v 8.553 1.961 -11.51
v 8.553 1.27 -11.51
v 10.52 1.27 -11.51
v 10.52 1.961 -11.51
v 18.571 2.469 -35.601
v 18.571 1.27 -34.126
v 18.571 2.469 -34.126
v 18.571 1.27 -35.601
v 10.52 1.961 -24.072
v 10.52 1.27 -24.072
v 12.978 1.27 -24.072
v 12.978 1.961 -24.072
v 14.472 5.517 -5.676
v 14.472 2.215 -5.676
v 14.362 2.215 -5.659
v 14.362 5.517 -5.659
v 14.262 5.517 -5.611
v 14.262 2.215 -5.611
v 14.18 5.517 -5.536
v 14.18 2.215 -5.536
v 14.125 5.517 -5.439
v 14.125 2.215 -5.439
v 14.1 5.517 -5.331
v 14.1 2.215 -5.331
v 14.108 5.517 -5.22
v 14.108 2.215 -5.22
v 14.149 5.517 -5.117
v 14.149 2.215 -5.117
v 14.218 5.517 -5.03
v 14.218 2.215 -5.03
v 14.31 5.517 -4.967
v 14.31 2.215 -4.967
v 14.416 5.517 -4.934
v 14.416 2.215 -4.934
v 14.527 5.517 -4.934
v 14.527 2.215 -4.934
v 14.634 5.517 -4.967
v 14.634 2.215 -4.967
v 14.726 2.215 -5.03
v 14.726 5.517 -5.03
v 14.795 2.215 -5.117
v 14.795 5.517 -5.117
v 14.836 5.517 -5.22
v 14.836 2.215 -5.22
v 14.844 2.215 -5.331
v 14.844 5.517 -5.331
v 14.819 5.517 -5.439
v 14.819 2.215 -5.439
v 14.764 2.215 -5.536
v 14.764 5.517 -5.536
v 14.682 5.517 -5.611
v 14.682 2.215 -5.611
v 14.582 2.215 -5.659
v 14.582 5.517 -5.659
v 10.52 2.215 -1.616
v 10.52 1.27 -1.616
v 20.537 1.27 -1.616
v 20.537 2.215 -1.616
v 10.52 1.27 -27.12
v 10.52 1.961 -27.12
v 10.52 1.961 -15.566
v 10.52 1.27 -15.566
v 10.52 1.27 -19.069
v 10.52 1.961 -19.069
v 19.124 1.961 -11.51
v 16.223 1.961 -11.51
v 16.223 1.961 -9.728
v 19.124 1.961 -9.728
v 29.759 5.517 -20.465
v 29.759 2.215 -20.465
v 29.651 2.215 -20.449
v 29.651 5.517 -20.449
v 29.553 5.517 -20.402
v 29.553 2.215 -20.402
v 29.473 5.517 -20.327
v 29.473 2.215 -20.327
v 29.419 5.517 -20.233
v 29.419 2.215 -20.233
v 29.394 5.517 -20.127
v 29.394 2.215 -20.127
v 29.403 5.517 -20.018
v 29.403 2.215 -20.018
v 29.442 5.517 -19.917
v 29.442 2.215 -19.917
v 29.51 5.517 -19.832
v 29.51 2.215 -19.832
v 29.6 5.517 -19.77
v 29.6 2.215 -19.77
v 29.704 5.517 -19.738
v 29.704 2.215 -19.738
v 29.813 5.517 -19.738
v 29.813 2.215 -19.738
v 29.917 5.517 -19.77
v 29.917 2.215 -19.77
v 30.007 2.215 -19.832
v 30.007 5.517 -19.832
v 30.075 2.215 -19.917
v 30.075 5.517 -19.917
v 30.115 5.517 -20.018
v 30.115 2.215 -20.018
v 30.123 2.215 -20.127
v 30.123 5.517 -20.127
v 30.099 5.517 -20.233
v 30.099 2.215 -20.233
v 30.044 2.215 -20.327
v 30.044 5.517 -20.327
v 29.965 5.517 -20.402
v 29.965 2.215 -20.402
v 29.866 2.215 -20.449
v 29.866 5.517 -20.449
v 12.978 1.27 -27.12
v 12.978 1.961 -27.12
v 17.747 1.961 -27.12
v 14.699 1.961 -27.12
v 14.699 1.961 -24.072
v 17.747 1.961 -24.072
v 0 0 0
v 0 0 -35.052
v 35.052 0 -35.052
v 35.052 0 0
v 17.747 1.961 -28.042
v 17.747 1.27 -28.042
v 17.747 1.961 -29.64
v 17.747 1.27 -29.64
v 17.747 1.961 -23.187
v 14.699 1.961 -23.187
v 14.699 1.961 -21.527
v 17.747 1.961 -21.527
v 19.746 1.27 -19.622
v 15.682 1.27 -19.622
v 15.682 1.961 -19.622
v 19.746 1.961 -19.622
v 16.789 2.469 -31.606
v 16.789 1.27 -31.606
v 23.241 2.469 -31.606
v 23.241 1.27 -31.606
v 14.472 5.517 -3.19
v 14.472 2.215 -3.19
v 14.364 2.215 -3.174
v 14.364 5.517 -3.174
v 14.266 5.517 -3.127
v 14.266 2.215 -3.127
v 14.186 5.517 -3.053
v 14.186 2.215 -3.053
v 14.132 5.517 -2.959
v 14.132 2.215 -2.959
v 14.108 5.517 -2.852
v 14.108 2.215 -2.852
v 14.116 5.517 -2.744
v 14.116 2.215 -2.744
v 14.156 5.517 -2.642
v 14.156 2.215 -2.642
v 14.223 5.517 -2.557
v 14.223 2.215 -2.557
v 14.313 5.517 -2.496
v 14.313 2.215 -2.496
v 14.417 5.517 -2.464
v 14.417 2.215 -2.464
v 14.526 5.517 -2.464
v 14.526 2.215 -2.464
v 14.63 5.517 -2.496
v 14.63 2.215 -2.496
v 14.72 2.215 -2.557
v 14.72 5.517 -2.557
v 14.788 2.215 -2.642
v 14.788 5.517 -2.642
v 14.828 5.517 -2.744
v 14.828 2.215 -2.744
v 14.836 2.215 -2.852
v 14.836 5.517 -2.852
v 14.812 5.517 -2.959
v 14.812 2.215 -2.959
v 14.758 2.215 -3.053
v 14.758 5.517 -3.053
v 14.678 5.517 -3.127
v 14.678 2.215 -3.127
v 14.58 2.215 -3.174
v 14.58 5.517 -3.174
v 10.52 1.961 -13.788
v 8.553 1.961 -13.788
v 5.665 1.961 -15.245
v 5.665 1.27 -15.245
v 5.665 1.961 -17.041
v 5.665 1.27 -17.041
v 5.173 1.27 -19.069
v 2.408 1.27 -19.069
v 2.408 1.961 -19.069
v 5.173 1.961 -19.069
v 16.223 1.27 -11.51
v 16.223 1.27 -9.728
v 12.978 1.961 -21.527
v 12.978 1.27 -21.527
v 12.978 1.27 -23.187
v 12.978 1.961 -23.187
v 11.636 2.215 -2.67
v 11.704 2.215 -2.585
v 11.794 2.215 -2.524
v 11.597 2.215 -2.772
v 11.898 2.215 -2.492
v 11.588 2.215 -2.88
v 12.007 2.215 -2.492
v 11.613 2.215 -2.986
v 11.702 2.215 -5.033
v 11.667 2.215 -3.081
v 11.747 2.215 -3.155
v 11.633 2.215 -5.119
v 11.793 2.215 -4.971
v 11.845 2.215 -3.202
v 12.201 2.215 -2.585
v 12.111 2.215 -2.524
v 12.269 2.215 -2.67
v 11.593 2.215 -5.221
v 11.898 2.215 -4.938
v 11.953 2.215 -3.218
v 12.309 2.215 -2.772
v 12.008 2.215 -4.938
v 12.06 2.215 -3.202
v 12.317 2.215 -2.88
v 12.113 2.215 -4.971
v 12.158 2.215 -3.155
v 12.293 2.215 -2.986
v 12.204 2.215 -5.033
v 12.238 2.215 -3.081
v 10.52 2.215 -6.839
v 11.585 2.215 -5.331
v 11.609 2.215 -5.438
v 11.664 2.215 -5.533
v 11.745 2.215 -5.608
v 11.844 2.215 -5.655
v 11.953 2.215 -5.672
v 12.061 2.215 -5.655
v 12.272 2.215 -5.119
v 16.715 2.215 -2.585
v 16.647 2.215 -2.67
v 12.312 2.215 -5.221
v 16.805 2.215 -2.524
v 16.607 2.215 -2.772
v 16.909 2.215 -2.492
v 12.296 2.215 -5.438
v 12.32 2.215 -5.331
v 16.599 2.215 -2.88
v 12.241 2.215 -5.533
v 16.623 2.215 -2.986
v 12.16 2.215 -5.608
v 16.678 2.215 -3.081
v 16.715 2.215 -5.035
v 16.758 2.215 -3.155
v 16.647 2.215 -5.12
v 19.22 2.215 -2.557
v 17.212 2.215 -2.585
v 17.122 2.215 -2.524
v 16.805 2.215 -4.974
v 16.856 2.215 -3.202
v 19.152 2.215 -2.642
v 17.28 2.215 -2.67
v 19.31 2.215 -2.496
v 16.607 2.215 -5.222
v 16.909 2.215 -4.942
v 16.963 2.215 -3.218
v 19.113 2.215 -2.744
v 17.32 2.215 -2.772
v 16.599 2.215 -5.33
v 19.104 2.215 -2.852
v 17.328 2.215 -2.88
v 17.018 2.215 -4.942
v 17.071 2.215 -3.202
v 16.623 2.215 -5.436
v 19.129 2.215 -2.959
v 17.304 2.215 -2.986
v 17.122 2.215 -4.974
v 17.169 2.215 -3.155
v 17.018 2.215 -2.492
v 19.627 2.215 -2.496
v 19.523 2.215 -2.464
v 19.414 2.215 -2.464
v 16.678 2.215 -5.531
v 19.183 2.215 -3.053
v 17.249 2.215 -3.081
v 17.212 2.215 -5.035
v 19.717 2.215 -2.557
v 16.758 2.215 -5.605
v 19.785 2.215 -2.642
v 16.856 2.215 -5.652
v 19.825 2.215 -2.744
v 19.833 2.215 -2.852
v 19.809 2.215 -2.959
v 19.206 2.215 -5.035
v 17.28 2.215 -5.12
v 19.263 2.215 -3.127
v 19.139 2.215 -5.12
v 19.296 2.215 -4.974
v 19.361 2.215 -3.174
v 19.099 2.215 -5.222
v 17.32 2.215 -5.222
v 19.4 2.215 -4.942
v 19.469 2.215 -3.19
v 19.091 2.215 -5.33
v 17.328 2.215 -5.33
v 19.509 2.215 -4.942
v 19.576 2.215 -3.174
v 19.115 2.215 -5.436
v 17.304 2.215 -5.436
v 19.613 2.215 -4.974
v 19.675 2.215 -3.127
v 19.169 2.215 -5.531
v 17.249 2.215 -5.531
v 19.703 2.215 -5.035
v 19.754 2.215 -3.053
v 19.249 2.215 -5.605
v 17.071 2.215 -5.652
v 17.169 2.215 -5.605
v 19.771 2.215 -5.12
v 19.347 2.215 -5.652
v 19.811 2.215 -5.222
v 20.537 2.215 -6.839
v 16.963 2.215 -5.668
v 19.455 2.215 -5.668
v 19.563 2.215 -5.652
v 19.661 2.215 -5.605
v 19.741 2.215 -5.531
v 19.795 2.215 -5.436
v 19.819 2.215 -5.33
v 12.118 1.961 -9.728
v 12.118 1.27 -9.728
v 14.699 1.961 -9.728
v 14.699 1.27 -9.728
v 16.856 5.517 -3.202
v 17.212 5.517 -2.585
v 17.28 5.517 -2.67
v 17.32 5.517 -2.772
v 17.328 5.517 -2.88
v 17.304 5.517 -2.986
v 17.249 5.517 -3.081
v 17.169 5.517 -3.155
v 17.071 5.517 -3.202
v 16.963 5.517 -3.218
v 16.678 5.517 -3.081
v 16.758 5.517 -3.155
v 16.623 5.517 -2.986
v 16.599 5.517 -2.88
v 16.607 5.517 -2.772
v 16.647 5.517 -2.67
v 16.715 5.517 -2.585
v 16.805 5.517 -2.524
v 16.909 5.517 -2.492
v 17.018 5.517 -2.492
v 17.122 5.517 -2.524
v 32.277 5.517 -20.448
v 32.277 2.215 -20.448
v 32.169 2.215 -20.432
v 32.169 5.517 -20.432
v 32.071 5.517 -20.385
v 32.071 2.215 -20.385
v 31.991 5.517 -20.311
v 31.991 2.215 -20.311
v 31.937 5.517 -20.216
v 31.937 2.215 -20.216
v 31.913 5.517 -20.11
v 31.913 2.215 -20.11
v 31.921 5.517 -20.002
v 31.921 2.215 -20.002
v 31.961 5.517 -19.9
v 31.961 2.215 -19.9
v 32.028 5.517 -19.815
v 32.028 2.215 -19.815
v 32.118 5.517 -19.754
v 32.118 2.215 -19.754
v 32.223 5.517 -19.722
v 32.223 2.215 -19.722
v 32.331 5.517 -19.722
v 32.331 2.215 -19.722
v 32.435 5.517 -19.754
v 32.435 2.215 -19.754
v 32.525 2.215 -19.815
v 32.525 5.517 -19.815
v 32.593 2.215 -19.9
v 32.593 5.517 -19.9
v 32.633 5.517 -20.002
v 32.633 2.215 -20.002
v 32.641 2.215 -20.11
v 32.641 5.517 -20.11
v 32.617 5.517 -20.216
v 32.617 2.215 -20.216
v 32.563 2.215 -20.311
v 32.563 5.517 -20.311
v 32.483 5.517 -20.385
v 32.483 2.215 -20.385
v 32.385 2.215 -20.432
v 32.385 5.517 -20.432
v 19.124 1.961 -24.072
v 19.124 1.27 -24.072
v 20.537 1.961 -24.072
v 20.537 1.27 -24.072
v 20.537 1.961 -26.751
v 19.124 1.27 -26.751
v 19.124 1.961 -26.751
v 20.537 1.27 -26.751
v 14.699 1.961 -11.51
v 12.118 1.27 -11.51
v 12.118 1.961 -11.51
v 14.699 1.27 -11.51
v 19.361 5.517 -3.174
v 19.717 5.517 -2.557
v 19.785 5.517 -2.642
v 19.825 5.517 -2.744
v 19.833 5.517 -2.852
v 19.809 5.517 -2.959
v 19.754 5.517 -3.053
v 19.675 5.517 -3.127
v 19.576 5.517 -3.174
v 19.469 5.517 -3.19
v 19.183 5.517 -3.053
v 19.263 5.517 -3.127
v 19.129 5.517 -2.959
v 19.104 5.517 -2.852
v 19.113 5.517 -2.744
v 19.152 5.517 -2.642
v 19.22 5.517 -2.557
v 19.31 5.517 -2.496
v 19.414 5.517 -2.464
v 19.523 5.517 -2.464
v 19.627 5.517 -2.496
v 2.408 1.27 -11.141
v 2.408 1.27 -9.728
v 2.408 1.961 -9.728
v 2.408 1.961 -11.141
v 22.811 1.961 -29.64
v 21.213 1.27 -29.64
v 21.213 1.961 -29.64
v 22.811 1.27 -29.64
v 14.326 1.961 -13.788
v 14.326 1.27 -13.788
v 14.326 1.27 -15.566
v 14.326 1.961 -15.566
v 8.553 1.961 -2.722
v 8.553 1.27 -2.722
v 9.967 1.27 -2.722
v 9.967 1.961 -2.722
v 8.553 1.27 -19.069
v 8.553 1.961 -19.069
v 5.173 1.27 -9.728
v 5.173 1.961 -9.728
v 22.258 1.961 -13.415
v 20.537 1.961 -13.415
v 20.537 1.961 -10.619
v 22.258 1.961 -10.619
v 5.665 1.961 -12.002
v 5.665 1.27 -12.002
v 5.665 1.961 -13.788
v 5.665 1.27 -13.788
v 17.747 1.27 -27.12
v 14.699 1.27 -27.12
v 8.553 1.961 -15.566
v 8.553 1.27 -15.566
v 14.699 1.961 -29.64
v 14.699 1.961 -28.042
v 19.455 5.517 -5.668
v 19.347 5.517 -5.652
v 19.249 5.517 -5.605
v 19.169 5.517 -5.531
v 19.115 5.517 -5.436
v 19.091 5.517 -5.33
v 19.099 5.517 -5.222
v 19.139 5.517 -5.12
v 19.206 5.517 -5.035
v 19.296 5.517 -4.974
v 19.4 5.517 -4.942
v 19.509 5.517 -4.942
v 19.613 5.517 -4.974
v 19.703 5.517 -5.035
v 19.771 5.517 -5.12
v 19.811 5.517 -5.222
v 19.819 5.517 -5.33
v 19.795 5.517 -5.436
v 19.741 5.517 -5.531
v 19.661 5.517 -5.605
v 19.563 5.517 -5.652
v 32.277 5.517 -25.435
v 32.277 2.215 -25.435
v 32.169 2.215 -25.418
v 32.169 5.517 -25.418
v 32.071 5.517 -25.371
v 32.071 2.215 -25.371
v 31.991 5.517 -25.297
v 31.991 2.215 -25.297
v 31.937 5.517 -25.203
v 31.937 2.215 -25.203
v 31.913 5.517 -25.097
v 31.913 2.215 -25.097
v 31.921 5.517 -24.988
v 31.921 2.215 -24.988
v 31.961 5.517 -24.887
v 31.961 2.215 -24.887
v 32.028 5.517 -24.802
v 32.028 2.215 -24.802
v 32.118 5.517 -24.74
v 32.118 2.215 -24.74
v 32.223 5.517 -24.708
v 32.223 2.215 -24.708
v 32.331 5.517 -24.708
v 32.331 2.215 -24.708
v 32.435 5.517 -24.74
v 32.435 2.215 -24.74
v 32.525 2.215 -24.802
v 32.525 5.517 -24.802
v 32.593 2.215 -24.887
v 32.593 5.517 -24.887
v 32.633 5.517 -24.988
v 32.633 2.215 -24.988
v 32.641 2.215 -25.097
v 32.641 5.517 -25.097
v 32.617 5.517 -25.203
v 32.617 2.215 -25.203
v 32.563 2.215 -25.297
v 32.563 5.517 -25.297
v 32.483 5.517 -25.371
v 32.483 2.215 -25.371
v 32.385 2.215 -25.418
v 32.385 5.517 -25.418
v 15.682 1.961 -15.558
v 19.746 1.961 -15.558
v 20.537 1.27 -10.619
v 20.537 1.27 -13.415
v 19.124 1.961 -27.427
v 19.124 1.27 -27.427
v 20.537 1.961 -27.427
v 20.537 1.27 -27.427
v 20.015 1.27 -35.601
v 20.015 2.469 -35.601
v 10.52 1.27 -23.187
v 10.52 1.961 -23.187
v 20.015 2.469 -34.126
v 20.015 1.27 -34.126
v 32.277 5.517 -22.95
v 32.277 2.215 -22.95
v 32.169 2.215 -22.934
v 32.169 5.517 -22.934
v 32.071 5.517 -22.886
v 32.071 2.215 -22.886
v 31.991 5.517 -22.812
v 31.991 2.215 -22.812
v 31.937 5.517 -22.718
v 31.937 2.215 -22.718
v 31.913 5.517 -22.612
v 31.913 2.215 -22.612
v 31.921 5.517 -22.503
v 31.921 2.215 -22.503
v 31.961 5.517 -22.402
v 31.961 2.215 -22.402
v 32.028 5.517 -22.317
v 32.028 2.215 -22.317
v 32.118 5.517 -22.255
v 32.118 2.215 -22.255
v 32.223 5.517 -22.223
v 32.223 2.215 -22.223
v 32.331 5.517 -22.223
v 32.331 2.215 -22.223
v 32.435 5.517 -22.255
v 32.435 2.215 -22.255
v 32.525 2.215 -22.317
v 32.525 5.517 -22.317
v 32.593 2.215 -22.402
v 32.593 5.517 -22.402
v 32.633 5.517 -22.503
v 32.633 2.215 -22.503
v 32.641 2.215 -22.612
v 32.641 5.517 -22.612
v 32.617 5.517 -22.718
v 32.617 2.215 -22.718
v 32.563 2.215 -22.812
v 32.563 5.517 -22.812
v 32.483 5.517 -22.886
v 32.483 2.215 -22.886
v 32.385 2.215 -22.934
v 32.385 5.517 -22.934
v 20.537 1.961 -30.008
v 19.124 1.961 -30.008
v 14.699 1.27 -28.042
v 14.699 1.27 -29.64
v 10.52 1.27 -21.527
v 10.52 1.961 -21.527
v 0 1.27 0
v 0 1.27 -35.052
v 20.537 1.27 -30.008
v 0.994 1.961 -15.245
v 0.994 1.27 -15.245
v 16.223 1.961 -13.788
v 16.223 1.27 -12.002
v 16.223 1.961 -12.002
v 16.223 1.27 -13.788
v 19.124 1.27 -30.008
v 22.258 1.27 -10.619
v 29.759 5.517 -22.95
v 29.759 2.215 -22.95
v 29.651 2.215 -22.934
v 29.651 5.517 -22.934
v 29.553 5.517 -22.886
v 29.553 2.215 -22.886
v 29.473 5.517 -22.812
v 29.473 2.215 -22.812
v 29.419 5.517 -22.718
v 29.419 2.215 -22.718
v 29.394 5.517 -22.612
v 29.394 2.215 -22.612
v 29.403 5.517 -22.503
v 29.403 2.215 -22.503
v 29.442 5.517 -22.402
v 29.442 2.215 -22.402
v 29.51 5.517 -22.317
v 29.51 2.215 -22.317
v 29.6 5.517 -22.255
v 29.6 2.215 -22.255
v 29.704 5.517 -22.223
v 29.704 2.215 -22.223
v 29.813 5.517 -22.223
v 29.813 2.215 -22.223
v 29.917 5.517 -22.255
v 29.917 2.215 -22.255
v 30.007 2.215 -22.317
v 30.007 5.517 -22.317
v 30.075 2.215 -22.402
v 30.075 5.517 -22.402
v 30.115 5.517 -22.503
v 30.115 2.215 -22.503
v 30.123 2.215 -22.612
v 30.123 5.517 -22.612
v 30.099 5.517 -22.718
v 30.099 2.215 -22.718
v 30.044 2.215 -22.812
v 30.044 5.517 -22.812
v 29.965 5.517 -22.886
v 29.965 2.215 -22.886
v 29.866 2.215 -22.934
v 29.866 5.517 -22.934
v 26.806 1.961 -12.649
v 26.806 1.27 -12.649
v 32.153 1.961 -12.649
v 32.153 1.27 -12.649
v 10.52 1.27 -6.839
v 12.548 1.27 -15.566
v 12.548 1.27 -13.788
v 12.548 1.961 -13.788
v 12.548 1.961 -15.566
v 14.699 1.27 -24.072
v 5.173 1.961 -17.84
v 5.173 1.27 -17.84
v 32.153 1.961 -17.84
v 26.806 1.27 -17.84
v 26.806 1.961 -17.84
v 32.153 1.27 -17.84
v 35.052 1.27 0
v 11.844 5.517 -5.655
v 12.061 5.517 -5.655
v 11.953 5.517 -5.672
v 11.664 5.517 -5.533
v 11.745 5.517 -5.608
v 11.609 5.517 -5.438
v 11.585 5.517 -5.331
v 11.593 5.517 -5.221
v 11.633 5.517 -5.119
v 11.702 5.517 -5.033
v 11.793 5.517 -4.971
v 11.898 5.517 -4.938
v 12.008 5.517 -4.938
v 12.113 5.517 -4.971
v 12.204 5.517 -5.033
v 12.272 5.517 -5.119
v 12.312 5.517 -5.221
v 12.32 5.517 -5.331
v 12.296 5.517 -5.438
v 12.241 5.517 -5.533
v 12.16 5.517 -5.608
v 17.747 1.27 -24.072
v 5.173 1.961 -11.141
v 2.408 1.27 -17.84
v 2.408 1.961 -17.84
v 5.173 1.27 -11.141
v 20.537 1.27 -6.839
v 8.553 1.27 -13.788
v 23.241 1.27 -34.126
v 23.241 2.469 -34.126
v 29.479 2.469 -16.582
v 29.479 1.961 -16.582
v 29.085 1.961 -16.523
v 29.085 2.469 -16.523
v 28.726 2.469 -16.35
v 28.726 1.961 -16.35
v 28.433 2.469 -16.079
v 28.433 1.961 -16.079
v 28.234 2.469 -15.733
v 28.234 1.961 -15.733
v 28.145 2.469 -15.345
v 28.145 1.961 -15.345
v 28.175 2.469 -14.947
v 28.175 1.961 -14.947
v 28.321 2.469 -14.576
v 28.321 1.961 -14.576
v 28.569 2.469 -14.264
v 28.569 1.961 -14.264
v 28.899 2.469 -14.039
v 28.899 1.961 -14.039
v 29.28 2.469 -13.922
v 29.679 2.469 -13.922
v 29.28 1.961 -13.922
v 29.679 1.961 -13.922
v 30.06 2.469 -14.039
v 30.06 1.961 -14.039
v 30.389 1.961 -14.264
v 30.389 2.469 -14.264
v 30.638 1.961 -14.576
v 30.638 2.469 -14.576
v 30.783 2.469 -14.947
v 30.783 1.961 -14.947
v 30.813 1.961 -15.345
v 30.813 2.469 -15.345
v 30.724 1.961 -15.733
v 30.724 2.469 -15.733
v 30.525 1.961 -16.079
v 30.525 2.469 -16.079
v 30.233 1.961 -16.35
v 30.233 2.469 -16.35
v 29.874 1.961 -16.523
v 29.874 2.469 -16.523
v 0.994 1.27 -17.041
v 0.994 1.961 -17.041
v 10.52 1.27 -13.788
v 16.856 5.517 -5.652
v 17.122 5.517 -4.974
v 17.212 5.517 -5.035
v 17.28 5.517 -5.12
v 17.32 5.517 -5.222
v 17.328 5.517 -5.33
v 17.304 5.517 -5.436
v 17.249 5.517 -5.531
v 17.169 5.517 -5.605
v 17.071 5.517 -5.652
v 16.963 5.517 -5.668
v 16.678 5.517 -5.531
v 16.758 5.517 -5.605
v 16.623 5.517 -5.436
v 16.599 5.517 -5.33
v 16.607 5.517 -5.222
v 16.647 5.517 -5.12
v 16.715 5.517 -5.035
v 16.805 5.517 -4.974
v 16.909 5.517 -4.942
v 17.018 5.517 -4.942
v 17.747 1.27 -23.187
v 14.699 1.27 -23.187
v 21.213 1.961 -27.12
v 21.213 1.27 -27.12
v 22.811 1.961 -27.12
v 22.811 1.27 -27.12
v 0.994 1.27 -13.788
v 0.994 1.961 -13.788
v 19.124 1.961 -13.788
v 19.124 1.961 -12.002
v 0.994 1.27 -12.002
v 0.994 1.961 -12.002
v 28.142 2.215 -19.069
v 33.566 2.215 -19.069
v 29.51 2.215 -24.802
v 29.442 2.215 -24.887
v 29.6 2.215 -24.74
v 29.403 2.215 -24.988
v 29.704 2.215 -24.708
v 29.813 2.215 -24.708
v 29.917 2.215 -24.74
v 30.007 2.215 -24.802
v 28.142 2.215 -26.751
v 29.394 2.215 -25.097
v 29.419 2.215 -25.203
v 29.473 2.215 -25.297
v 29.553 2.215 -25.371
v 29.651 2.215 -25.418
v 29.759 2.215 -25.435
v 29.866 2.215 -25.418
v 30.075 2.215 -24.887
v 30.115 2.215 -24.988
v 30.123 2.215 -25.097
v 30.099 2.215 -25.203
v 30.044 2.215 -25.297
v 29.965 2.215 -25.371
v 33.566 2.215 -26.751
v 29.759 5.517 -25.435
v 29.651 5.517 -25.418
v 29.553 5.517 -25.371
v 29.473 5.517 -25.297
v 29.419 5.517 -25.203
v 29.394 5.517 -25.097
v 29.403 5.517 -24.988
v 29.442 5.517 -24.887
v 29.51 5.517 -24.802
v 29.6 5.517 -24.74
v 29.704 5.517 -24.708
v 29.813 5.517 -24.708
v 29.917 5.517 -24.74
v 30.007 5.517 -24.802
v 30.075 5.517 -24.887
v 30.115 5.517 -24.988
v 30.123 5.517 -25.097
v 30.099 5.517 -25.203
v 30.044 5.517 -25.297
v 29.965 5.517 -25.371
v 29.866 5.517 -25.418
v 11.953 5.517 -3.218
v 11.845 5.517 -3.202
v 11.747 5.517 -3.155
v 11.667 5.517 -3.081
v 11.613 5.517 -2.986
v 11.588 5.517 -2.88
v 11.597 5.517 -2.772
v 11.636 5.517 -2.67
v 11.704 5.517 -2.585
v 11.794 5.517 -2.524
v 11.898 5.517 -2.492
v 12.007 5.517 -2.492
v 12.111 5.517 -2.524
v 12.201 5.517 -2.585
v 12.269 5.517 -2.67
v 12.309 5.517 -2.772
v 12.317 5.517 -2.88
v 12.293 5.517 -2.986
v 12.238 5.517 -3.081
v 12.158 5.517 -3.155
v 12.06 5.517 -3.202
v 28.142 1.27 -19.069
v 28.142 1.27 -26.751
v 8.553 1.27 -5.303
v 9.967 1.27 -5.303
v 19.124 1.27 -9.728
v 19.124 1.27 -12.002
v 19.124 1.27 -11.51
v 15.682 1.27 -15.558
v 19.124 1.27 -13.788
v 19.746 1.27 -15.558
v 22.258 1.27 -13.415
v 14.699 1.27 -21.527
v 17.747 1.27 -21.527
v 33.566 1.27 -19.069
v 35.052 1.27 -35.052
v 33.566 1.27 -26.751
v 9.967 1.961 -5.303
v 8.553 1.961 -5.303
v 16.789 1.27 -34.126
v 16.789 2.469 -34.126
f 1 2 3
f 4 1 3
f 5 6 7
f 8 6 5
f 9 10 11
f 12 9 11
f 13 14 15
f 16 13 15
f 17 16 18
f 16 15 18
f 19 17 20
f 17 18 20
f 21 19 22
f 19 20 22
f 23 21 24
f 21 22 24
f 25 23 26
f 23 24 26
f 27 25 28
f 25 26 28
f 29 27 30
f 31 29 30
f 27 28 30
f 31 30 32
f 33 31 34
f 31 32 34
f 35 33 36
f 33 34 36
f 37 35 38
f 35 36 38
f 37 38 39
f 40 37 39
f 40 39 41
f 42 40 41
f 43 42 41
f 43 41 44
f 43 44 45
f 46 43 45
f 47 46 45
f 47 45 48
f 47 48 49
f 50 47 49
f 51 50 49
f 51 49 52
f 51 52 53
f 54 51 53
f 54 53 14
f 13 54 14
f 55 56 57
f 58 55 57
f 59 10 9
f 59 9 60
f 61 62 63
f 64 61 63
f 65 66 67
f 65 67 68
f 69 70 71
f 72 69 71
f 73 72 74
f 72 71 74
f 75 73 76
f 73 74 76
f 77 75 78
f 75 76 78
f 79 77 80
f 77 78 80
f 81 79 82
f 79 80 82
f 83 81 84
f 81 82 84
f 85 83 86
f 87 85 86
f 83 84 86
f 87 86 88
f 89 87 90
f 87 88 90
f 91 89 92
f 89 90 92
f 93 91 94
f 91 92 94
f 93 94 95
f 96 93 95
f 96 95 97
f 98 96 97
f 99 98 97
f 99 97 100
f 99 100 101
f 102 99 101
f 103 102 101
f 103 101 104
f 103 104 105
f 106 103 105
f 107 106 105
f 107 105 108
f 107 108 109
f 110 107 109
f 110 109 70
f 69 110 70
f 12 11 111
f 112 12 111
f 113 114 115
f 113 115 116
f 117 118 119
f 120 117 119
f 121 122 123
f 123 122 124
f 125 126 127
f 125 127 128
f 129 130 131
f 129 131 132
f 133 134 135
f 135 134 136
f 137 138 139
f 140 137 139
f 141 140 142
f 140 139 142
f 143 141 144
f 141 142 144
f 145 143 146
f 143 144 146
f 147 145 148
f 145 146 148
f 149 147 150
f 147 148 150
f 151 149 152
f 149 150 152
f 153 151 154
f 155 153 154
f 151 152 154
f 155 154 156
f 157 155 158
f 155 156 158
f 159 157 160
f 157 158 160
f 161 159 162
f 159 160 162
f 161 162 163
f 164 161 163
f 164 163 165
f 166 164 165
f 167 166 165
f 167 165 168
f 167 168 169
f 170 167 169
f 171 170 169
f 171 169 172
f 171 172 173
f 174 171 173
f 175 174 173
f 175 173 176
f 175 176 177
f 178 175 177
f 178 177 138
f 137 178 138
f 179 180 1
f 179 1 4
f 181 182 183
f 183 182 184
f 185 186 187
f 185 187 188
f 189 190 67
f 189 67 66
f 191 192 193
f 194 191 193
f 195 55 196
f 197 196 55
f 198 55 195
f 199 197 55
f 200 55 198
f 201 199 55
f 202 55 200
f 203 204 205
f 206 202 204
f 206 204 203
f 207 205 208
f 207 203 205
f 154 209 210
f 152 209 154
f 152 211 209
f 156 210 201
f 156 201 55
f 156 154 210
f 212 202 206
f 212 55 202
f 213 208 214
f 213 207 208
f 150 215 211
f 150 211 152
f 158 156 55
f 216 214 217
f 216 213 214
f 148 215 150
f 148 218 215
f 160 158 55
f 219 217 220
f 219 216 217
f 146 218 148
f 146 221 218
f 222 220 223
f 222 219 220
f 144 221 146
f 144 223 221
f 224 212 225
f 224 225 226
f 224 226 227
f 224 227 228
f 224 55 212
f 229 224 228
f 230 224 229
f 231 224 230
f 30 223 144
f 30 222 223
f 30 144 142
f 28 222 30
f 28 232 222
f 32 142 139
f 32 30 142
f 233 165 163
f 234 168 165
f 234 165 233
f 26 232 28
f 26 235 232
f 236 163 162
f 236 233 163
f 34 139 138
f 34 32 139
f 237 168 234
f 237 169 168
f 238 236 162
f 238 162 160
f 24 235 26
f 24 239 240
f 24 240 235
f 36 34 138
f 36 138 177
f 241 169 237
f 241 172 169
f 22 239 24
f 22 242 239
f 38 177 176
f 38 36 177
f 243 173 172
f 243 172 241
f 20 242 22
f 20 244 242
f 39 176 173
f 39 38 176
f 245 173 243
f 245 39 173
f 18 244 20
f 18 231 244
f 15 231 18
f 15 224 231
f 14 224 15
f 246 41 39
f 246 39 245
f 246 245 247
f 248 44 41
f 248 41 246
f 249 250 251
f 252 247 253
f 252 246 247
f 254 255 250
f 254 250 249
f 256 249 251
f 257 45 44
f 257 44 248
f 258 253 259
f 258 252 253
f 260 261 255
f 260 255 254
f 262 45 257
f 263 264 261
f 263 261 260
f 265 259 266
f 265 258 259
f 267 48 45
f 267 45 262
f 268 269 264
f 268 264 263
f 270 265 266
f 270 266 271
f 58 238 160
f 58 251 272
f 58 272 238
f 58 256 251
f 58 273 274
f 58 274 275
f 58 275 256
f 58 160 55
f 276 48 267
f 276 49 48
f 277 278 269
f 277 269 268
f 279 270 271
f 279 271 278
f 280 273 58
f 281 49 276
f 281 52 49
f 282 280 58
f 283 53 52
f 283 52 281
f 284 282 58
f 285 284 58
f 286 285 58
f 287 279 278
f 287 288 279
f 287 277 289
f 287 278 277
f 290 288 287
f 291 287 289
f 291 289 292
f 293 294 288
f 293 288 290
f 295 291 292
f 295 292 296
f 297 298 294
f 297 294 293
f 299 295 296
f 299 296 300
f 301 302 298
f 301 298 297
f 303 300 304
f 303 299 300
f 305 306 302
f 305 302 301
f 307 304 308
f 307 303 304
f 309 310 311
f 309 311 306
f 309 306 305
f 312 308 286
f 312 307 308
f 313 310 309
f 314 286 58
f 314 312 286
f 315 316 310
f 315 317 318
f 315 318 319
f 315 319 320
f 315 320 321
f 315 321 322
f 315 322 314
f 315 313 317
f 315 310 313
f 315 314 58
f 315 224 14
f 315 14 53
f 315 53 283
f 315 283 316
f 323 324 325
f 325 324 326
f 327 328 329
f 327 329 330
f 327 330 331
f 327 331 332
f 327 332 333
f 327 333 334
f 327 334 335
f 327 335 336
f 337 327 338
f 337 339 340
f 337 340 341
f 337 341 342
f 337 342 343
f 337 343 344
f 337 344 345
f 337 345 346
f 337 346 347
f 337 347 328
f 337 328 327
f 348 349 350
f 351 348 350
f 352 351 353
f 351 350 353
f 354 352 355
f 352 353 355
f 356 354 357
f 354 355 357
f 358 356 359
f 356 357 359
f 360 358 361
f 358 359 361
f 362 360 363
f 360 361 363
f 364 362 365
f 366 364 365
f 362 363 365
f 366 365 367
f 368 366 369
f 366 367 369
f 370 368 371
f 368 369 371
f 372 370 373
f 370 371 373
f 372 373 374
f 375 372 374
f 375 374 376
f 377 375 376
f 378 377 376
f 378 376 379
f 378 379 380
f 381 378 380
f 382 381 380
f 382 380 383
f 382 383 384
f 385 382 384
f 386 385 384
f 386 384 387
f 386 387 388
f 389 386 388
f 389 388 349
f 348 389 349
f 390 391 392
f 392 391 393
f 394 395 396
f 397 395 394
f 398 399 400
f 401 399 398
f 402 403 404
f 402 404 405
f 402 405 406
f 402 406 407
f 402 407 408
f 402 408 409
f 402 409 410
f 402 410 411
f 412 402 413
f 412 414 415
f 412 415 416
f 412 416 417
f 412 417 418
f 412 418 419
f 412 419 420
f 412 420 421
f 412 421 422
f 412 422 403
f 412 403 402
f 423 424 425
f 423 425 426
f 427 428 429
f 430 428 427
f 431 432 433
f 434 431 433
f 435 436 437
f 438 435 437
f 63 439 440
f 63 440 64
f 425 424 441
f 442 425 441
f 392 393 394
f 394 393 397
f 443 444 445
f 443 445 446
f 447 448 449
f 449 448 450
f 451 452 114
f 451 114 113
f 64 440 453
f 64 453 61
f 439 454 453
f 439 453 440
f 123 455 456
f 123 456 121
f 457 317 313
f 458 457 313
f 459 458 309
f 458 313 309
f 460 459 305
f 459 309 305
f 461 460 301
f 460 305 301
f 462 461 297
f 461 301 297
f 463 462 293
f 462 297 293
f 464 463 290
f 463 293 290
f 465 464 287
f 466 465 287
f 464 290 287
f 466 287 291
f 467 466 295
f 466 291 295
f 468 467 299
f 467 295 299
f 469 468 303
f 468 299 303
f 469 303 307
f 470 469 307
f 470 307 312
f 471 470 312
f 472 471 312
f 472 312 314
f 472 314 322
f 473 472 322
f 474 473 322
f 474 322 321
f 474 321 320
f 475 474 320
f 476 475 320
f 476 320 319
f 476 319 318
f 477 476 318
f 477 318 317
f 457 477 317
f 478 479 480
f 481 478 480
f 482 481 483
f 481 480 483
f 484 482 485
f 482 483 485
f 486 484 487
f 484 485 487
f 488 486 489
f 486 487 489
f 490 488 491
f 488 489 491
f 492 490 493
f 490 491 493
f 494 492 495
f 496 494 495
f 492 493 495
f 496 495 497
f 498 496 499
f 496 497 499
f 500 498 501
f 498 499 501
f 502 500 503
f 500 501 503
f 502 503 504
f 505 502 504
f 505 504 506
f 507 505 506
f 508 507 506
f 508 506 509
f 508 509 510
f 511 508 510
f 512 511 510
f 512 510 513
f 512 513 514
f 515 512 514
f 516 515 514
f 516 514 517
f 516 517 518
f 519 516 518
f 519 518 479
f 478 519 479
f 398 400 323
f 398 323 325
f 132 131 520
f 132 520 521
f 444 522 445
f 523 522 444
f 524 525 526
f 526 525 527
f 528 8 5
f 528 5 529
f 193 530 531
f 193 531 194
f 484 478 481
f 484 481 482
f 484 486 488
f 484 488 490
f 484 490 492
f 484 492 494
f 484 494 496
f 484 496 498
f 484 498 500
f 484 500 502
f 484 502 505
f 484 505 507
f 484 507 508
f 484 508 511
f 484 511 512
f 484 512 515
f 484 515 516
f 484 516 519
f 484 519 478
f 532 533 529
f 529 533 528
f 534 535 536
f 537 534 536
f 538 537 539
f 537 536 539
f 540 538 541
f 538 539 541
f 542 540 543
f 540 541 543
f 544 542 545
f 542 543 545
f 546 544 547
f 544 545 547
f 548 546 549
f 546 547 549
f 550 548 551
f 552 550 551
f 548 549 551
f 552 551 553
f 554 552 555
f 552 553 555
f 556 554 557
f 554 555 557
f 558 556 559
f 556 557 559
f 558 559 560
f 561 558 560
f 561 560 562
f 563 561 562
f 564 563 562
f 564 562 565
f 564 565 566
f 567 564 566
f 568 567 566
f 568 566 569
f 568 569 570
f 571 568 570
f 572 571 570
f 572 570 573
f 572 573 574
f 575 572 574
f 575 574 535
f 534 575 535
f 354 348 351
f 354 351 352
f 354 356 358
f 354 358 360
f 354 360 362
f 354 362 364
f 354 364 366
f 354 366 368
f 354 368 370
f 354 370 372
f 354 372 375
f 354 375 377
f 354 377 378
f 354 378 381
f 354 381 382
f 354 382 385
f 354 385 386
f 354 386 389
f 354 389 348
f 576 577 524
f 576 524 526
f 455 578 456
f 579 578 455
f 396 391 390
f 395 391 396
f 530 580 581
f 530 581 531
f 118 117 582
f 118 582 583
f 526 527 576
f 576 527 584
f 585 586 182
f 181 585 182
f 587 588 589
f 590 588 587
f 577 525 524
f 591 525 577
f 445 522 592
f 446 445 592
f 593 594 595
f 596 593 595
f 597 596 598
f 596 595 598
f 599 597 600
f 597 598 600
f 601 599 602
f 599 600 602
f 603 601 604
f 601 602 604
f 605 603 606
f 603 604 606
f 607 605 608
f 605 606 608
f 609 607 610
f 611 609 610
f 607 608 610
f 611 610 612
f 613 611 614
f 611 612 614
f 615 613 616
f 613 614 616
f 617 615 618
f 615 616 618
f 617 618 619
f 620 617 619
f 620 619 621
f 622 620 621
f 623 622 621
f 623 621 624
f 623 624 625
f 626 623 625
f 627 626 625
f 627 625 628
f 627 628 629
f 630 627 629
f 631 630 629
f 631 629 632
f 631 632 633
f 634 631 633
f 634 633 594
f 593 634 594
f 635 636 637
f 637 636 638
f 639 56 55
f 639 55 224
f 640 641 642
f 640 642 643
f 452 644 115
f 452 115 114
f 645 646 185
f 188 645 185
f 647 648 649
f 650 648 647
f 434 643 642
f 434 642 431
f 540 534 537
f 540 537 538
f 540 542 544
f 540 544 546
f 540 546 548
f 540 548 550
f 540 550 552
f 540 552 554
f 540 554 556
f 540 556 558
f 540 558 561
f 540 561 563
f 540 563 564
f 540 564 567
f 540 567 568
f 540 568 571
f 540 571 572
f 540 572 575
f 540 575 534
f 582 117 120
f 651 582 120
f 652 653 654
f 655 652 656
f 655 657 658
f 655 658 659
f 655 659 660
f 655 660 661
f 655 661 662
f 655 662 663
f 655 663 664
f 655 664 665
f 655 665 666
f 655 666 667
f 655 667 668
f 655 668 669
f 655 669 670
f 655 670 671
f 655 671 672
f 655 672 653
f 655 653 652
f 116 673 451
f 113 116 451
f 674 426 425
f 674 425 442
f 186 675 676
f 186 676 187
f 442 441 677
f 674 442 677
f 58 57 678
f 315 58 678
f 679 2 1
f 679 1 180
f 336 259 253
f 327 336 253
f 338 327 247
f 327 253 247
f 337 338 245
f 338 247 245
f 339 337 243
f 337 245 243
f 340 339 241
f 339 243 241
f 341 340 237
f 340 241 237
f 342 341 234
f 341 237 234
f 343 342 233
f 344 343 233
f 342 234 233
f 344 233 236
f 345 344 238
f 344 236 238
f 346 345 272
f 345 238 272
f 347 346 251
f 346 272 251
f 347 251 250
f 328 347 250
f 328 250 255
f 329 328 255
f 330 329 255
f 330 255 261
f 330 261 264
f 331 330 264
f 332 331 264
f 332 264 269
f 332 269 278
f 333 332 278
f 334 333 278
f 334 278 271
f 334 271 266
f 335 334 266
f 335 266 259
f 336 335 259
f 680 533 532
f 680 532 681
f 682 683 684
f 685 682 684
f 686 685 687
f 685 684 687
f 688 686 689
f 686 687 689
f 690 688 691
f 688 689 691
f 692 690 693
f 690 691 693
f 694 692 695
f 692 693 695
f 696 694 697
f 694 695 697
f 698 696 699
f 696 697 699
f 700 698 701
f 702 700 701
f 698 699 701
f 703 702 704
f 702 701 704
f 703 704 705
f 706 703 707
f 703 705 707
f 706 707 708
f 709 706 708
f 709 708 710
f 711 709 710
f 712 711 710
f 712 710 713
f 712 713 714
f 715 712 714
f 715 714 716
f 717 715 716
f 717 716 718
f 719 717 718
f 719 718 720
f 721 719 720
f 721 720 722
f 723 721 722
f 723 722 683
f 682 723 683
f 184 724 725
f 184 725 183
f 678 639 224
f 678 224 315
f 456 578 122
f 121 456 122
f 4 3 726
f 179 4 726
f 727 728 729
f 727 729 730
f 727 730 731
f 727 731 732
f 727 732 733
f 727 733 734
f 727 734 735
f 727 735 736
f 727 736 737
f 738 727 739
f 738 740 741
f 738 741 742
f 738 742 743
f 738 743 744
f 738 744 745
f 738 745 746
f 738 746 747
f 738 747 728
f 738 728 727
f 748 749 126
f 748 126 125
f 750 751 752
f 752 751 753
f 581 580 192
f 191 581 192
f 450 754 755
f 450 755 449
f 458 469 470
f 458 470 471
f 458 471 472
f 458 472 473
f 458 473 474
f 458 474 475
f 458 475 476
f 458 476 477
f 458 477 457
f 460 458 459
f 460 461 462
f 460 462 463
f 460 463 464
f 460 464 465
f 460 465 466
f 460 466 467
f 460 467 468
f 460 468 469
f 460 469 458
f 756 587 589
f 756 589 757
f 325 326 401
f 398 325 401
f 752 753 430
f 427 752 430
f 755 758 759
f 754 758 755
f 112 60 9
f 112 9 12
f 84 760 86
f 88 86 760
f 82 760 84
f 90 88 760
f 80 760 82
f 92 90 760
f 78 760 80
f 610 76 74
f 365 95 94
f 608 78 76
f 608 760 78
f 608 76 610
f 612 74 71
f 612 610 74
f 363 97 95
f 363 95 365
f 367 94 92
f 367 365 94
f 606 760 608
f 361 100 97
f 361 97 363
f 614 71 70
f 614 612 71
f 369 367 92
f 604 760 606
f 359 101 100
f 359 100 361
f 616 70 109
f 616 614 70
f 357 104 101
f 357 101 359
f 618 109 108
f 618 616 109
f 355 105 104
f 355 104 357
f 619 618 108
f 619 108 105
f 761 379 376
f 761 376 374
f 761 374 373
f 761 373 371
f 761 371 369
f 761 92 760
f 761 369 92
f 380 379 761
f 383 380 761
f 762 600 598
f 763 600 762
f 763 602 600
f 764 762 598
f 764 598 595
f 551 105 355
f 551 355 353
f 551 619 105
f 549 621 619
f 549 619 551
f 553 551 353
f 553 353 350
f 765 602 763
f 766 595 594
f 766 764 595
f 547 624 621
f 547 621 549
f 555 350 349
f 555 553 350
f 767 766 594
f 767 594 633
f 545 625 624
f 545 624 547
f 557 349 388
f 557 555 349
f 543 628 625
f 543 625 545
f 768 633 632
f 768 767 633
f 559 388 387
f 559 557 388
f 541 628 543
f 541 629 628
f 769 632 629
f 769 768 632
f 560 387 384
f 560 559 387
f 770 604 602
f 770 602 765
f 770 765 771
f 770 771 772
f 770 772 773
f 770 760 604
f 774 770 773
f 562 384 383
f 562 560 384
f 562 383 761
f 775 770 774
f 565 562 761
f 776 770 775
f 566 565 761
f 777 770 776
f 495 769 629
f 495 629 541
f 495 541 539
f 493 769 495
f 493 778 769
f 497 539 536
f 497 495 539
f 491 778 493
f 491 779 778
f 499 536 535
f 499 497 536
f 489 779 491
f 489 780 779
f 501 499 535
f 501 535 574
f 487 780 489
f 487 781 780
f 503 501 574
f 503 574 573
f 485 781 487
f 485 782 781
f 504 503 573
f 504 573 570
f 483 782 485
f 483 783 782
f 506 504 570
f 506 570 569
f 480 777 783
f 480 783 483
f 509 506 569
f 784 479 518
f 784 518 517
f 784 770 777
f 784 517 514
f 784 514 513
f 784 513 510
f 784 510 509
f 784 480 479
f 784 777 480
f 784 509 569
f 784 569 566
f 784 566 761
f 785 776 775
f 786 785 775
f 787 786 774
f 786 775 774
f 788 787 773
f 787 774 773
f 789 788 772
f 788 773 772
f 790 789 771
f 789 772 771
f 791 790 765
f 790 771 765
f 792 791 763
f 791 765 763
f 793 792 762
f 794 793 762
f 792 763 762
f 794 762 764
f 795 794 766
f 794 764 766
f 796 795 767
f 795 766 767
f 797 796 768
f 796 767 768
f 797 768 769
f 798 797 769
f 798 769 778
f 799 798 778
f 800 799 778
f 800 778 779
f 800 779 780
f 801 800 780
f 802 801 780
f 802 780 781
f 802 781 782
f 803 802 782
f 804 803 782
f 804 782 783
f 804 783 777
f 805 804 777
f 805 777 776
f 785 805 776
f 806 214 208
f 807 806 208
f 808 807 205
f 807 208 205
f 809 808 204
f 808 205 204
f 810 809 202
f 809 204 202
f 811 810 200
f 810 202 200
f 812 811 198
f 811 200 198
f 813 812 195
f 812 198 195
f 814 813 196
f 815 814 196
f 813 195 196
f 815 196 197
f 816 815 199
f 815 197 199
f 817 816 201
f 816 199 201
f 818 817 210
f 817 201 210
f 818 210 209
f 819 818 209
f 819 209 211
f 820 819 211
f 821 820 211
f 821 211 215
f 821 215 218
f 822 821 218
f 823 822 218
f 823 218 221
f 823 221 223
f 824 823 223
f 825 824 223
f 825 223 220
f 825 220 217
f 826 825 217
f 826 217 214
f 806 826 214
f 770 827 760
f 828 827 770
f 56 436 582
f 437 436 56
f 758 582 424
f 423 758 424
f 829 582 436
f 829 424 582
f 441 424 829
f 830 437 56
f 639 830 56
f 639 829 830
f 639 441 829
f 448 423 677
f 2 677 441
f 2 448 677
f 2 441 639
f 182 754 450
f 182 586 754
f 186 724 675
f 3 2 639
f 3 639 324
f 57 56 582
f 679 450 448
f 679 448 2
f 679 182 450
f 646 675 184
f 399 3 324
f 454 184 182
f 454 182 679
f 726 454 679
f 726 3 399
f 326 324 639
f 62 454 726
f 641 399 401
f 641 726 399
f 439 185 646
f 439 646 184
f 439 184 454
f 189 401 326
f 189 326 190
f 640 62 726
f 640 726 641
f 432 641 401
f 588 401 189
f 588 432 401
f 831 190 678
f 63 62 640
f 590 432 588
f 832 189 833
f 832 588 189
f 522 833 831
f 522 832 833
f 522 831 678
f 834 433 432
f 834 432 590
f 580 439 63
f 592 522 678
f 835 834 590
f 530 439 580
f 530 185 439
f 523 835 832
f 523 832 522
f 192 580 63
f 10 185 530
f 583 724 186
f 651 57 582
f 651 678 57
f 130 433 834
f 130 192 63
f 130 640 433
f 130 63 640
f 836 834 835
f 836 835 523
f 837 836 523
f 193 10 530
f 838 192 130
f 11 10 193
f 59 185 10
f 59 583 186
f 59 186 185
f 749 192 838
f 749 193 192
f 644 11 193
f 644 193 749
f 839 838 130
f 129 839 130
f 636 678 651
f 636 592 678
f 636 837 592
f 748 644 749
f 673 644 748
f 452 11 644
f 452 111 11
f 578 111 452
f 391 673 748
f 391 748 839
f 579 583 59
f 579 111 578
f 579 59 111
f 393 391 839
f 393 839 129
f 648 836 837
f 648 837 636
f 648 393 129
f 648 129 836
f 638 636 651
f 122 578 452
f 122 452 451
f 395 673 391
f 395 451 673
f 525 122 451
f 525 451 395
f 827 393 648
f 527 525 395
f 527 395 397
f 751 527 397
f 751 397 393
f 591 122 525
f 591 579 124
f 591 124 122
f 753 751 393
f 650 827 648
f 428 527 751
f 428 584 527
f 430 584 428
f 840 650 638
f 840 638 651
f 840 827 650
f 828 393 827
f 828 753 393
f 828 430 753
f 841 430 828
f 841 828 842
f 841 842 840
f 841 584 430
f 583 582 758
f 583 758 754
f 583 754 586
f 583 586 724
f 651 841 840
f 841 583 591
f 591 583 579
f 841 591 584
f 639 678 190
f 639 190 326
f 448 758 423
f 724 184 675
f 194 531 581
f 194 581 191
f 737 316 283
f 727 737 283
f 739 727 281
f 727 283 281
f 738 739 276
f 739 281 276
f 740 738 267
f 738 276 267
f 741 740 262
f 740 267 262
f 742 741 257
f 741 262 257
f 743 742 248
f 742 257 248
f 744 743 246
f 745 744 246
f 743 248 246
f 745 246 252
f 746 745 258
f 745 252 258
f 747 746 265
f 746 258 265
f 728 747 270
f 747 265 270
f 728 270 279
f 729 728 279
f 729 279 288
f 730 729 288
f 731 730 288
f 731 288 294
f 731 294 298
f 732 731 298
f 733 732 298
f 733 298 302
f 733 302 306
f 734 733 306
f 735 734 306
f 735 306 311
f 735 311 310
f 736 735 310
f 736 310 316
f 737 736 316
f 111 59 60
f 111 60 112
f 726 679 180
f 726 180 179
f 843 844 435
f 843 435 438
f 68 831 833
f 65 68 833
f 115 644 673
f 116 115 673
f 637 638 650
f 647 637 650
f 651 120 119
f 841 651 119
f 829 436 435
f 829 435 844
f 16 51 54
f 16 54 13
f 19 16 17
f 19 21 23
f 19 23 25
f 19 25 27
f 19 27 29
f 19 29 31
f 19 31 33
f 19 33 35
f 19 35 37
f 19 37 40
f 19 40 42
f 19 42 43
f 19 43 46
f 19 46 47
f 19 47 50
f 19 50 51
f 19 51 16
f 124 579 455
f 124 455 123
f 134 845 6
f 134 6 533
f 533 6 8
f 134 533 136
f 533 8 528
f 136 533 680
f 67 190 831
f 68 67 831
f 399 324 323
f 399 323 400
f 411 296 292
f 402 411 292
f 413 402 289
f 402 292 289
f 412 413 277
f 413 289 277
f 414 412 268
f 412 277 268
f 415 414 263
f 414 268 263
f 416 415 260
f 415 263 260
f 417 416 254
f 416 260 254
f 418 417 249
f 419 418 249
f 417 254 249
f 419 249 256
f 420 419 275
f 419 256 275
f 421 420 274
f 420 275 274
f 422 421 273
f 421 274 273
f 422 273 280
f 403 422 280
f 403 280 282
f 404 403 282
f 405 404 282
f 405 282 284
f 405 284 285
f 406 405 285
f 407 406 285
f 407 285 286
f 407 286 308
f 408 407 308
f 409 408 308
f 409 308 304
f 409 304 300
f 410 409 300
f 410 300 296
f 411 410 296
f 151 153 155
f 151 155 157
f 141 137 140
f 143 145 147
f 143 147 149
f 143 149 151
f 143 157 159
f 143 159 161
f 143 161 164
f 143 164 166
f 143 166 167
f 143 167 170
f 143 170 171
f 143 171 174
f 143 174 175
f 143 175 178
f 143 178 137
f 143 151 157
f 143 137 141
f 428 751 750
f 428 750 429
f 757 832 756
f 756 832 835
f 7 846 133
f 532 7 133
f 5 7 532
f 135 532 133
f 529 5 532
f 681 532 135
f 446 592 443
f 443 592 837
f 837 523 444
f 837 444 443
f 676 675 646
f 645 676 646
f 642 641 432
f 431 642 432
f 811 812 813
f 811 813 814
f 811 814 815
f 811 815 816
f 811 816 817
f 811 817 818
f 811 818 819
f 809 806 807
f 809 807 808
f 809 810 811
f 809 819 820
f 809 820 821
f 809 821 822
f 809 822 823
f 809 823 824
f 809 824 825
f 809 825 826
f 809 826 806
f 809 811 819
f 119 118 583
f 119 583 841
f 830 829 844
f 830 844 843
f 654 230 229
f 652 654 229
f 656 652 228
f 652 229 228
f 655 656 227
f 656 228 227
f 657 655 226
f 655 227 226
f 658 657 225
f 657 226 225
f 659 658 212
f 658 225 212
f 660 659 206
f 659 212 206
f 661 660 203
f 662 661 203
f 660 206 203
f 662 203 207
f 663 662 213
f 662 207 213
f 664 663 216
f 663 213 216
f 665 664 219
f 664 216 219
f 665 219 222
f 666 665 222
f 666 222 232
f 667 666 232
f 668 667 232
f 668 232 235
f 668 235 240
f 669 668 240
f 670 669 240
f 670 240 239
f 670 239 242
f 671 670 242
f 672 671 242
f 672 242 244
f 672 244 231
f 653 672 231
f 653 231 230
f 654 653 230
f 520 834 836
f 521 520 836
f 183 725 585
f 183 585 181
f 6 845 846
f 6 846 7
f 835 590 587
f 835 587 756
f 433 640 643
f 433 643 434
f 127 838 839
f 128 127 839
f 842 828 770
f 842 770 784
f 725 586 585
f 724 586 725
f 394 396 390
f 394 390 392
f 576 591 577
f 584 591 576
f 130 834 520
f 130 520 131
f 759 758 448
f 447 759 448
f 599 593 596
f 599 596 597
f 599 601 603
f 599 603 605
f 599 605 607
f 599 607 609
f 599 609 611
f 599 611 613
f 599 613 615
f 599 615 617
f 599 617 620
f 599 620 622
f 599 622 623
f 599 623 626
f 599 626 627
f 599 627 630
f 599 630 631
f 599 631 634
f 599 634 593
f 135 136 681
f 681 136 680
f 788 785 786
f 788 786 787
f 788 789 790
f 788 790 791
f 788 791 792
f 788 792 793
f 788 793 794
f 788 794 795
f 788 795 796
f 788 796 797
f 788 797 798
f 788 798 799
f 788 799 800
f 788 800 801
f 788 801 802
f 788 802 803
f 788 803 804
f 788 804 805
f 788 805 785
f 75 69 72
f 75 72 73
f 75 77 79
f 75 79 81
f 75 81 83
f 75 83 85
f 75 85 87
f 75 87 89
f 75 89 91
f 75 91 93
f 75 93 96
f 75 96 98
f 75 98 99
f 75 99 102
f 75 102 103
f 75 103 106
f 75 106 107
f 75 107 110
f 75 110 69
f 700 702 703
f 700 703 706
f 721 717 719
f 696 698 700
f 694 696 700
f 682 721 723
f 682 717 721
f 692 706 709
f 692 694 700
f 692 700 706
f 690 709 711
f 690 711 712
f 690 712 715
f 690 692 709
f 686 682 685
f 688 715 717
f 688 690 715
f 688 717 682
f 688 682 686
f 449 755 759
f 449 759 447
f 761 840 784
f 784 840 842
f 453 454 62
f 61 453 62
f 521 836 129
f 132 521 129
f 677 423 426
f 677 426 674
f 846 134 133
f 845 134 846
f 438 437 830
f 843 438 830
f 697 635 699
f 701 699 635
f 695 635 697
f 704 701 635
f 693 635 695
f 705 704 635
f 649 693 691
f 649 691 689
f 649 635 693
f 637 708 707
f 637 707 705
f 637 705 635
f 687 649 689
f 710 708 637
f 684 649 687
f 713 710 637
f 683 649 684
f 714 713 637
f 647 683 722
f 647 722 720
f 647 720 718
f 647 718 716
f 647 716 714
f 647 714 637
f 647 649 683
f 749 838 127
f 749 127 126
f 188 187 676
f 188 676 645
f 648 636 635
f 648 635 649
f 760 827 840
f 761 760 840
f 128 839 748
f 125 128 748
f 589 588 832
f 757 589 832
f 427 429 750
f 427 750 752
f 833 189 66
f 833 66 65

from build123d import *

# Parameters (mm, degrees)
SKETCH1_W           = 35.052
SKETCH1_H           = 35.052
BOSS_EXTRUDE1_DEPTH = 1.27
SKETCH2_W           = 6.452921714
SKETCH2_H           = 2.519712288
SKETCH2_W_2         = 1.444225336
SKETCH2_H_2         = 1.474953535
BOSS_EXTRUDE2_DEPTH = 1.19888
SKETCH2_3_W         = 3.048
SKETCH2_3_H         = 1.597866329
BOSS_EXTRUDE3_DEPTH = 0.69088
SKETCH2_4_W         = 1.778
SKETCH2_4_H         = 1.778
SKETCH2_4_W_2       = 4.064
SKETCH2_4_H_2       = 4.064
SKETCH2_4_W_3       = 3.048
SKETCH2_4_H_3       = 3.048
SKETCH2_4_W_4       = 2.458255891
SKETCH2_4_W_5       = 1.597866329
SKETCH2_4_H_4       = 2.519712288
SKETCH2_4_W_6       = 1.413497138
SKETCH2_4_H_5       = 2.581168686
SKETCH2_4_H_6       = 2.679261616
SKETCH2_4_H_7       = 1.659322727
SKETCH2_4_W_7       = 1.966604713
SKETCH2_4_H_8       = 3.503014645
SKETCH2_4_H_9       = 2.27812222
SKETCH2_4_W_8       = 2.581168686
SKETCH2_4_H_10      = 1.782235521
SKETCH2_4_W_9       = 2.900860604
SKETCH2_4_H_11      = 1.786471042
SKETCH2_4_W_10      = 1.720779123
SKETCH2_4_H_12      = 2.796266077
SKETCH2_4_W_11      = 4.670686193
SKETCH2_4_H_13      = 1.79654074
SKETCH2_4_W_12      = 2.765537878
SKETCH2_4_H_14      = 1.229127945
SKETCH2_4_H_15      = 1.413497137
BOSS_EXTRUDE4_DEPTH = 0.69088
SKETCH2_5_R         = 0.368738384
SKETCH2_5_R_2       = 0.372973905
SKETCH2_5_R_3       = 0.365334134
BOSS_EXTRUDE5_DEPTH = 4.24688
SKETCH2_6_W         = 5.424501995
SKETCH2_6_H         = 7.68204966
SKETCH2_6_R         = 0.365334134
SKETCH2_6_W_2       = 10.017392757
SKETCH2_6_H_2       = 5.223793769
SKETCH2_6_R_2       = 0.368738384
SKETCH2_6_R_3       = 0.372973905
BOSS_EXTRUDE6_DEPTH = 0.94488
SKETCH2_7_R         = 1.337651576
BOSS_EXTRUDE7_DEPTH = 1.19888
SKETCH2_8_W         = 5.346706563
SKETCH2_8_H         = 5.19094781
SKETCH2_8_R         = 1.337651576
BOSS_EXTRUDE8_DEPTH = 0.69088


with BuildPart() as part:
    # Sketch1 → Boss-Extrude1 (new body)
    with BuildSketch(Plane(origin=(0, 0, 0), x_dir=(1, 0, 0), z_dir=(0, 1, 0))):
        with Locations((17.526, 17.526)):
            Rectangle(SKETCH1_W, SKETCH1_H)
    extrude(amount=BOSS_EXTRUDE1_DEPTH)

    # Sketch2<3> → Boss-Extrude3 (add)
    with BuildSketch(Plane(origin=(0, 1.27, 0), x_dir=(1, 0, 0), z_dir=(0, 1, 0))):
        with Locations((16.223005725, 28.840795859)):
            Rectangle(SKETCH2_3_W, SKETCH2_3_H)
    extrude(amount=BOSS_EXTRUDE3_DEPTH)

    # Sketch2<4> → Boss-Extrude4 (add)
    with BuildSketch(Plane(origin=(0, 1.27, 0), x_dir=(1, 0, 0), z_dir=(0, 1, 0))):
        with Locations((13.43703182, 14.677214046)):
            Rectangle(SKETCH2_4_W, SKETCH2_4_H)
        with Locations((17.714308082, 17.590336267)):
            Rectangle(SKETCH2_4_W_2, SKETCH2_4_H_2)
        with Locations((16.223005725, 25.596016735)):
            Rectangle(SKETCH2_4_W_3, SKETCH2_4_H_3)
        with Locations((11.749098656, 25.596016735)):
            Rectangle(SKETCH2_4_W_4, SKETCH2_4_H_3)
        with Locations((22.012317002, 28.379872879)):
            Rectangle(SKETCH2_4_W_5, SKETCH2_4_H_4)
        with Locations((19.830614898, 28.717883064)):
            Rectangle(SKETCH2_4_W_6, SKETCH2_4_H_5)
        with Locations((19.830614898, 25.411647543)):
            Rectangle(SKETCH2_4_W_6, SKETCH2_4_H_6)
        with Locations((11.749098656, 22.357145946)):
            Rectangle(SKETCH2_4_W_4, SKETCH2_4_H_7)
        with Locations((16.223005725, 22.357145946)):
            Rectangle(SKETCH2_4_W_3, SKETCH2_4_H_7)
        with Locations((9.536668354, 17.317721369)):
            Rectangle(SKETCH2_4_W_7, SKETCH2_4_H_8)
        with Locations((9.536668354, 12.649152936)):
            Rectangle(SKETCH2_4_W_7, SKETCH2_4_H_9)
        with Locations((13.408421382, 10.618974066)):
            Rectangle(SKETCH2_4_W_8, SKETCH2_4_H_10)
        with Locations((17.673436027, 12.894978525)):
            Rectangle(SKETCH2_4_W_9, SKETCH2_4_H_11)
        with Locations((17.673436027, 10.618974066)):
            Rectangle(SKETCH2_4_W_9, SKETCH2_4_H_10)
        with Locations((21.397753029, 12.017107104)):
            Rectangle(SKETCH2_4_W_10, SKETCH2_4_H_12)
        with Locations((3.329572229, 16.142897211)):
            Rectangle(SKETCH2_4_W_11, SKETCH2_4_H_13)
        with Locations((3.329572229, 12.894978525)):
            Rectangle(SKETCH2_4_W_11, SKETCH2_4_H_11)
        with Locations((3.790495208, 18.454664719)):
            Rectangle(SKETCH2_4_W_12, SKETCH2_4_H_14)
        with Locations((3.790495208, 10.434604874)):
            Rectangle(SKETCH2_4_W_12, SKETCH2_4_H_15)
        with Locations((9.260114566, 4.012411358)):
            Rectangle(SKETCH2_4_W_6, SKETCH2_4_H_5)
    extrude(amount=BOSS_EXTRUDE4_DEPTH)

    # Sketch2<5> → Boss-Extrude5 (add)
    with BuildSketch(Plane(origin=(0, 1.27, 0), x_dir=(1, 0, 0), z_dir=(0, 1, 0))):
        with Locations((11.952697536, 5.302995701)):
            Circle(SKETCH2_5_R)
        with Locations((14.471900881, 5.302995701)):
            Circle(SKETCH2_5_R_2)
        with Locations((16.963420672, 5.302995701)):
            Circle(SKETCH2_5_R_3)
        with Locations((19.454940464, 5.302995701)):
            Circle(SKETCH2_5_R_3)
        with Locations((19.468782241, 2.825153872)):
            Circle(SKETCH2_5_R_3)
        with Locations((16.963420672, 2.852837425)):
            Circle(SKETCH2_5_R_3)
        with Locations((14.471900881, 2.825153872)):
            Circle(SKETCH2_5_R_3)
        with Locations((11.952697536, 2.852837425)):
            Circle(SKETCH2_5_R_3)
        with Locations((29.758781713, 25.069345596)):
            Circle(SKETCH2_5_R_3)
        with Locations((32.276984447, 25.069345596)):
            Circle(SKETCH2_5_R_3)
        with Locations((32.276984447, 22.58449654)):
            Circle(SKETCH2_5_R_3)
        with Locations((32.276984447, 20.082970645)):
            Circle(SKETCH2_5_R_3)
        with Locations((29.758781713, 20.099647484)):
            Circle(SKETCH2_5_R_3)
        with Locations((29.758781713, 22.58449654)):
            Circle(SKETCH2_5_R_3)
    extrude(amount=BOSS_EXTRUDE5_DEPTH)

    # Sketch2<6> → Boss-Extrude6 (add)
    # profile 1 of 2: a face of its own
    with BuildSketch(Plane(origin=(0, 1.27, 0), x_dir=(1, 0, 0), z_dir=(0, 1, 0))):
        with Locations((30.853868693, 22.910253521)):
            Rectangle(SKETCH2_6_W, SKETCH2_6_H)
        with Locations((29.758781713, 20.099647484)):
            Circle(SKETCH2_6_R, mode=Mode.SUBTRACT)
        with Locations((32.276984447, 20.082970645)):
            Circle(SKETCH2_6_R, mode=Mode.SUBTRACT)
        with Locations((29.758781713, 22.58449654)):
            Circle(SKETCH2_6_R, mode=Mode.SUBTRACT)
        with Locations((32.276984447, 22.58449654)):
            Circle(SKETCH2_6_R, mode=Mode.SUBTRACT)
        with Locations((29.758781713, 25.069345596)):
            Circle(SKETCH2_6_R, mode=Mode.SUBTRACT)
        with Locations((32.276984447, 25.069345596)):
            Circle(SKETCH2_6_R, mode=Mode.SUBTRACT)
    # profile 2 of 2: a face of its own
    with BuildSketch(Plane(origin=(0, 1.27, 0), x_dir=(1, 0, 0), z_dir=(0, 1, 0))):
        with Locations((15.528667089, 4.227508749)):
            Rectangle(SKETCH2_6_W_2, SKETCH2_6_H_2)
        with Locations((11.952697536, 2.852837425)):
            Circle(SKETCH2_6_R, mode=Mode.SUBTRACT)
        with Locations((11.952697536, 5.302995701)):
            Circle(SKETCH2_6_R_2, mode=Mode.SUBTRACT)
        with Locations((14.471900881, 2.825153872)):
            Circle(SKETCH2_6_R, mode=Mode.SUBTRACT)
        with Locations((16.963420672, 2.852837425)):
            Circle(SKETCH2_6_R, mode=Mode.SUBTRACT)
        with Locations((14.471900881, 5.302995701)):
            Circle(SKETCH2_6_R_3, mode=Mode.SUBTRACT)
        with Locations((16.963420672, 5.302995701)):
            Circle(SKETCH2_6_R, mode=Mode.SUBTRACT)
        with Locations((19.468782241, 2.825153872)):
            Circle(SKETCH2_6_R, mode=Mode.SUBTRACT)
        with Locations((19.454940464, 5.302995701)):
            Circle(SKETCH2_6_R, mode=Mode.SUBTRACT)
    extrude(amount=BOSS_EXTRUDE6_DEPTH)

    # Sketch2<7> → Boss-Extrude7 (add)
    with BuildSketch(Plane(origin=(0, 1.27, 0), x_dir=(1, 0, 0), z_dir=(0, 1, 0))):
        with Locations((29.479269271, 15.244626841)):
            Circle(SKETCH2_7_R)
    extrude(amount=BOSS_EXTRUDE7_DEPTH)

    # Sketch2<8> → Boss-Extrude8 (add)
    with BuildSketch(Plane(origin=(0, 1.27, 0), x_dir=(1, 0, 0), z_dir=(0, 1, 0))):
        with Locations((29.479269271, 15.244626841)):
            Rectangle(SKETCH2_8_W, SKETCH2_8_H)
        with Locations((29.479269271, 15.244626841)):
            Circle(SKETCH2_8_R, mode=Mode.SUBTRACT)
    extrude(amount=BOSS_EXTRUDE8_DEPTH)


with BuildPart() as body_2:
    # Sketch2 → Boss-Extrude2 (new body)
    with BuildSketch(Plane(origin=(0, 1.27, 0), x_dir=(1, 0, 0), z_dir=(0, 1, 0))):
        with Locations((20.01498409, 32.86618988)):
            Rectangle(SKETCH2_W, SKETCH2_H)
        with Locations((19.292871422, 34.863522792)):
            Rectangle(SKETCH2_W_2, SKETCH2_H_2)
    extrude(amount=BOSS_EXTRUDE2_DEPTH)


solid = Compound([part.part, body_2.part])
